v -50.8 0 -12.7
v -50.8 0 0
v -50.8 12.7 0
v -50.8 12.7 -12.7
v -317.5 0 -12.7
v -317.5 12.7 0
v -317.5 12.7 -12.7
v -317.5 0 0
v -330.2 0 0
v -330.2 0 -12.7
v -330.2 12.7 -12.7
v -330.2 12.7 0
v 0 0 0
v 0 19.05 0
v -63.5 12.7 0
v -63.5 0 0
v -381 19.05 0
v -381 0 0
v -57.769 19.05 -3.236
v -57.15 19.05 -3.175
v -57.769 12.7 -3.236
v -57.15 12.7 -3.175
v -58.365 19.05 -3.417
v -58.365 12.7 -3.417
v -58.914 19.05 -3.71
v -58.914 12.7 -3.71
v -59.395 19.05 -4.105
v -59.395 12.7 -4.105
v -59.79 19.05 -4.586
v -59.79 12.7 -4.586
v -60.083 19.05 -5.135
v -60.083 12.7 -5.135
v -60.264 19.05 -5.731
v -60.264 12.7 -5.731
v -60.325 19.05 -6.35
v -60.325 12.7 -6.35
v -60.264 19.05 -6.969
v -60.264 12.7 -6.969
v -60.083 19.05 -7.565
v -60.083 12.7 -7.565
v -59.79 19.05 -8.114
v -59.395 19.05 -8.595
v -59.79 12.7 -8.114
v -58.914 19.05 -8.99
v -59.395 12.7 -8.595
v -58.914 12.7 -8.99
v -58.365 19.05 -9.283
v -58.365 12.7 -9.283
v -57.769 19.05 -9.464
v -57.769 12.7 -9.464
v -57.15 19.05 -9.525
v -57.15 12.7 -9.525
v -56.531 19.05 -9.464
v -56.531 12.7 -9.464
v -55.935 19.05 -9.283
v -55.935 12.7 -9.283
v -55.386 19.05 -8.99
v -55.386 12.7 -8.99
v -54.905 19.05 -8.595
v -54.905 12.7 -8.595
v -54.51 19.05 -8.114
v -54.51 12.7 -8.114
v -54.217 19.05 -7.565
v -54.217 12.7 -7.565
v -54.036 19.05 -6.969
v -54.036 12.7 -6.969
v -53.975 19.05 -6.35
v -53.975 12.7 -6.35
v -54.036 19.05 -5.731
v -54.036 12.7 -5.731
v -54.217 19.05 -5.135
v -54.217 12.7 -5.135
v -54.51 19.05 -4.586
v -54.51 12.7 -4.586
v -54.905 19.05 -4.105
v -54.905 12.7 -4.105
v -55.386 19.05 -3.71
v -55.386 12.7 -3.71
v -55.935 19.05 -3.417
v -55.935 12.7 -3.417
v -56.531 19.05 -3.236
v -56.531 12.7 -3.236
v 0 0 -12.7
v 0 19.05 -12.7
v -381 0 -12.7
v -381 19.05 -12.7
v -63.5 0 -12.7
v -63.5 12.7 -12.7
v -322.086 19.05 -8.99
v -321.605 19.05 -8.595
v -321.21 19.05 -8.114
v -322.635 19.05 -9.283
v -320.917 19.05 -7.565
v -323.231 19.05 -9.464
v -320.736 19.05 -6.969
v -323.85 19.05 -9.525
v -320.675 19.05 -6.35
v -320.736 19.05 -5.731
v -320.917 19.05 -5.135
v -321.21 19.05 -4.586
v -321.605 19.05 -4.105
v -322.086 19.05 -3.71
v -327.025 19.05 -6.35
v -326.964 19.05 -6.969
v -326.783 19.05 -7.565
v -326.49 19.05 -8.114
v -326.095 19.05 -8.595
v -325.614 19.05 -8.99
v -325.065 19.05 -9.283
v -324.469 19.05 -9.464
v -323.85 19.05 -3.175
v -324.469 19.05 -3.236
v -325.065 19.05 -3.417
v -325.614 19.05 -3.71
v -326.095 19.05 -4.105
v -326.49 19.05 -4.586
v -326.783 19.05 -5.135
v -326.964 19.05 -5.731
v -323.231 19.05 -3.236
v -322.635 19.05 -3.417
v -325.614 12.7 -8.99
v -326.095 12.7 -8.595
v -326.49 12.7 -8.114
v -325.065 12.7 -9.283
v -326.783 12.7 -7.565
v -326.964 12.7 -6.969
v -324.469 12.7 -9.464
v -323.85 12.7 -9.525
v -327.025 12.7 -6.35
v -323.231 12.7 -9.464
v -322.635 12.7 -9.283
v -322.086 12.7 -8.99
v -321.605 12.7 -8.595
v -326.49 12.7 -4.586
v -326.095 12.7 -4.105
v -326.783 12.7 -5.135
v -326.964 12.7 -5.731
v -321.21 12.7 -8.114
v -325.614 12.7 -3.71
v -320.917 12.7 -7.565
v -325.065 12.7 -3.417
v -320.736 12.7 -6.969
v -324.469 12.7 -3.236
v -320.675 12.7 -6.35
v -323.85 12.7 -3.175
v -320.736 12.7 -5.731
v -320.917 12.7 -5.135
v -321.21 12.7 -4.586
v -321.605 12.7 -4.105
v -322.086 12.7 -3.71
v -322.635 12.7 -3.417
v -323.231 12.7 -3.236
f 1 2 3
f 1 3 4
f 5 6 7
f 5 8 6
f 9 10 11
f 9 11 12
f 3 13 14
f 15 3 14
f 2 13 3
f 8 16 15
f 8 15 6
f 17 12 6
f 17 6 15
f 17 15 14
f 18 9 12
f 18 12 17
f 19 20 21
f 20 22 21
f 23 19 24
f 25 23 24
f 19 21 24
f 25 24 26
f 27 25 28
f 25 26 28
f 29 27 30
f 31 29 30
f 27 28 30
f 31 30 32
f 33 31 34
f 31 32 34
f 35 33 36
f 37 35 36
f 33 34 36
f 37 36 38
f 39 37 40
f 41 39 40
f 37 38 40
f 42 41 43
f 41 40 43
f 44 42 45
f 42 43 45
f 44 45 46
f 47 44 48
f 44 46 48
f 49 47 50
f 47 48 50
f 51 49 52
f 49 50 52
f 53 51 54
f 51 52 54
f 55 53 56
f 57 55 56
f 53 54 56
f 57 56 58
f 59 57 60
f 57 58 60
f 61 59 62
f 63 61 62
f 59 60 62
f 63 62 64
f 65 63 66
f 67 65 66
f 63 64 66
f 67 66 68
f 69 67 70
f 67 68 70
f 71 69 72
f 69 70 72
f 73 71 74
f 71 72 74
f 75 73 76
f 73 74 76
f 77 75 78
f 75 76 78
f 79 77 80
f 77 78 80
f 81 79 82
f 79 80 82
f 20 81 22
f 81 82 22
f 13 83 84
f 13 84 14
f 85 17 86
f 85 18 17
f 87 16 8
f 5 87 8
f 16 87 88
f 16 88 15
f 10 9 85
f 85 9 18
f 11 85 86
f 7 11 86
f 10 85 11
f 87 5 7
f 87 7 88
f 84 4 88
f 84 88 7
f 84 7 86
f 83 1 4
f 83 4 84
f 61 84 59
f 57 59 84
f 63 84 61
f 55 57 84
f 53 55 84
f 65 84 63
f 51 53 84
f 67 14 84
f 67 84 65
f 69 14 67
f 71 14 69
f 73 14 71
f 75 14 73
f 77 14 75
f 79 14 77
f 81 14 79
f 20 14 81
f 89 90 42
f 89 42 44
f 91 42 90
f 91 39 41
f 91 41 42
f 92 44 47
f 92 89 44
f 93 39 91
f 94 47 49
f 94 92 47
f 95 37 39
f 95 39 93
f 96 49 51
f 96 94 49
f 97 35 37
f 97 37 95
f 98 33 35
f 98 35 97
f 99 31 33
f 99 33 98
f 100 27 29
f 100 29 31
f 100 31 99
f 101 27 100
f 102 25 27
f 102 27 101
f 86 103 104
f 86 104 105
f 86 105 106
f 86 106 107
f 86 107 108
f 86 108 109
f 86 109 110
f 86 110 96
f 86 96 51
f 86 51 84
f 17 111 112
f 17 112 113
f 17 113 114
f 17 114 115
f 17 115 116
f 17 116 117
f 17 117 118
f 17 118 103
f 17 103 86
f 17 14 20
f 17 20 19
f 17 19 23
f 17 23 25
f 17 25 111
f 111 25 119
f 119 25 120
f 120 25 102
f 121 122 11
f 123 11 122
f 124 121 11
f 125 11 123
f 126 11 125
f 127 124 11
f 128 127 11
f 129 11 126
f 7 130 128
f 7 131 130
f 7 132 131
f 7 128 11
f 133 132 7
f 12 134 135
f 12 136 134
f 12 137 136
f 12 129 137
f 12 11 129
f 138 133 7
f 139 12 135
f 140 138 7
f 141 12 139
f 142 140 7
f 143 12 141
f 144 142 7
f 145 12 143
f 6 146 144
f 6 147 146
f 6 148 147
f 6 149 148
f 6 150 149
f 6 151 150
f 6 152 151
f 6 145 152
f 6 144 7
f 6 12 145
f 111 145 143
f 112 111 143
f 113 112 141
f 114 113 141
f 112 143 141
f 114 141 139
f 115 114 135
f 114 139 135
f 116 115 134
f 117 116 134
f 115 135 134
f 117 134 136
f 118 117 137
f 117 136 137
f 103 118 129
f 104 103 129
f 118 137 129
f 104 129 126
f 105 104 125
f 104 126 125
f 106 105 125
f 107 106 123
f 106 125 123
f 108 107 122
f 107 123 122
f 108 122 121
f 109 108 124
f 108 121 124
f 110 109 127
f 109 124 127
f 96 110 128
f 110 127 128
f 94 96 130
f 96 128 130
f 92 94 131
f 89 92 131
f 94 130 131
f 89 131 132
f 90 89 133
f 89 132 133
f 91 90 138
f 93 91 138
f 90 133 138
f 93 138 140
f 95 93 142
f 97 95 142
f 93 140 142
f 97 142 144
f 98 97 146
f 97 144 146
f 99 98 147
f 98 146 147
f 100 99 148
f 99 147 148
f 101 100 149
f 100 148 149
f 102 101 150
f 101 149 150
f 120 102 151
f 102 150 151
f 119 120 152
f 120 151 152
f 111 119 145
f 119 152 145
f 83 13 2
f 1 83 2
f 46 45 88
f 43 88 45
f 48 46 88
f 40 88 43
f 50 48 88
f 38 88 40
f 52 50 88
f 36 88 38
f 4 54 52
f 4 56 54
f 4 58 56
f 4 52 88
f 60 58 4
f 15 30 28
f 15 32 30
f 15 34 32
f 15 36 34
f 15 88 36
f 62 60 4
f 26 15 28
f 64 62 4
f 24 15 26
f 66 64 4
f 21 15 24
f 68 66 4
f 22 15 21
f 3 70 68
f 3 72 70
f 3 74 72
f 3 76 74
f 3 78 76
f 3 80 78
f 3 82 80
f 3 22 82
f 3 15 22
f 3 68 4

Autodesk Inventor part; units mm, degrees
ref_plane "YZ Plane" through (0, 0, 0) normal (1, 0, 0) x (0, 1, 0)
ref_plane "XZ Plane" through (0, 0, 0) normal (0, 1, 0) x (-1, 0, 0)
ref_plane "XY Plane" through (0, 0, 0) normal (0, 0, 1) x (1, 0, 0)
sketch "Sketch1" plane through (0, 0, 0) normal (0, 1, 0) x (-1, 0, 0)
  line L0 (0, 0) -> (381, 0)
  line L1 (381, 0) -> (381, -12.7)
  line L2 (381, -12.7) -> (0, -12.7)
  line L3 (0, -12.7) -> (0, 0)
  dimension "d0" = 381
  dimension "d1" = 12.7
extrude "Extrusion1" add sketch "Sketch1" along normal blind 19.05
sketch "Sketch2" plane through (0, 0, 0) normal (0, -1, 0) x (1, 0, 0)
  line L0 (-63.5, 0) -> (-50.8, 0)
  line L1 (-50.8, 0) -> (-50.8, -12.7)
  line L2 (-50.8, -12.7) -> (-63.5, -12.7)
  line L3 (-63.5, -12.7) -> (-63.5, 0)
  line L4 (0, -12.7) -> (0, 0) projected
  line L5 (-330.2, 0) -> (-317.5, 0)
  line L6 (-317.5, 0) -> (-317.5, -12.7)
  line L7 (-317.5, -12.7) -> (-330.2, -12.7)
  line L8 (-330.2, -12.7) -> (-330.2, 0)
  dimension "d4" = 12.7
  dimension "d5" = 12.7
  dimension "d6" = 50.8
  dimension "d7" = 12.7
  dimension "d8" = 12.7
  dimension "d9" = 330.2
extrude "Extrusion2" cut sketch "Sketch2" against normal blind 12.7
sketch "Sketch3" plane through (0, 19.05, 0) normal (0, 1, 0) x (1, 0, 0)
  circle A0 centre (-57.15, 6.35) radius 3.175
  line L0 (0, 0) -> (0, 12.7) projected
  line L1 (0, 12.7) -> (-381, 12.7) projected
  circle A1 centre (-323.85, 6.35) radius 3.175
  dimension "d12" = 6.35
  dimension "d13" = 57.15
  dimension "d15" = 6.35
  dimension "d16" = 6.35
  dimension "d17" = 323.85
hole "Hole1" at (-323.85, 19.05, -6.35) at (-57.15, 19.05, -6.35) direction (0, -1, 0) diameter 6.35 end through all
properties part number "Rack Side"
